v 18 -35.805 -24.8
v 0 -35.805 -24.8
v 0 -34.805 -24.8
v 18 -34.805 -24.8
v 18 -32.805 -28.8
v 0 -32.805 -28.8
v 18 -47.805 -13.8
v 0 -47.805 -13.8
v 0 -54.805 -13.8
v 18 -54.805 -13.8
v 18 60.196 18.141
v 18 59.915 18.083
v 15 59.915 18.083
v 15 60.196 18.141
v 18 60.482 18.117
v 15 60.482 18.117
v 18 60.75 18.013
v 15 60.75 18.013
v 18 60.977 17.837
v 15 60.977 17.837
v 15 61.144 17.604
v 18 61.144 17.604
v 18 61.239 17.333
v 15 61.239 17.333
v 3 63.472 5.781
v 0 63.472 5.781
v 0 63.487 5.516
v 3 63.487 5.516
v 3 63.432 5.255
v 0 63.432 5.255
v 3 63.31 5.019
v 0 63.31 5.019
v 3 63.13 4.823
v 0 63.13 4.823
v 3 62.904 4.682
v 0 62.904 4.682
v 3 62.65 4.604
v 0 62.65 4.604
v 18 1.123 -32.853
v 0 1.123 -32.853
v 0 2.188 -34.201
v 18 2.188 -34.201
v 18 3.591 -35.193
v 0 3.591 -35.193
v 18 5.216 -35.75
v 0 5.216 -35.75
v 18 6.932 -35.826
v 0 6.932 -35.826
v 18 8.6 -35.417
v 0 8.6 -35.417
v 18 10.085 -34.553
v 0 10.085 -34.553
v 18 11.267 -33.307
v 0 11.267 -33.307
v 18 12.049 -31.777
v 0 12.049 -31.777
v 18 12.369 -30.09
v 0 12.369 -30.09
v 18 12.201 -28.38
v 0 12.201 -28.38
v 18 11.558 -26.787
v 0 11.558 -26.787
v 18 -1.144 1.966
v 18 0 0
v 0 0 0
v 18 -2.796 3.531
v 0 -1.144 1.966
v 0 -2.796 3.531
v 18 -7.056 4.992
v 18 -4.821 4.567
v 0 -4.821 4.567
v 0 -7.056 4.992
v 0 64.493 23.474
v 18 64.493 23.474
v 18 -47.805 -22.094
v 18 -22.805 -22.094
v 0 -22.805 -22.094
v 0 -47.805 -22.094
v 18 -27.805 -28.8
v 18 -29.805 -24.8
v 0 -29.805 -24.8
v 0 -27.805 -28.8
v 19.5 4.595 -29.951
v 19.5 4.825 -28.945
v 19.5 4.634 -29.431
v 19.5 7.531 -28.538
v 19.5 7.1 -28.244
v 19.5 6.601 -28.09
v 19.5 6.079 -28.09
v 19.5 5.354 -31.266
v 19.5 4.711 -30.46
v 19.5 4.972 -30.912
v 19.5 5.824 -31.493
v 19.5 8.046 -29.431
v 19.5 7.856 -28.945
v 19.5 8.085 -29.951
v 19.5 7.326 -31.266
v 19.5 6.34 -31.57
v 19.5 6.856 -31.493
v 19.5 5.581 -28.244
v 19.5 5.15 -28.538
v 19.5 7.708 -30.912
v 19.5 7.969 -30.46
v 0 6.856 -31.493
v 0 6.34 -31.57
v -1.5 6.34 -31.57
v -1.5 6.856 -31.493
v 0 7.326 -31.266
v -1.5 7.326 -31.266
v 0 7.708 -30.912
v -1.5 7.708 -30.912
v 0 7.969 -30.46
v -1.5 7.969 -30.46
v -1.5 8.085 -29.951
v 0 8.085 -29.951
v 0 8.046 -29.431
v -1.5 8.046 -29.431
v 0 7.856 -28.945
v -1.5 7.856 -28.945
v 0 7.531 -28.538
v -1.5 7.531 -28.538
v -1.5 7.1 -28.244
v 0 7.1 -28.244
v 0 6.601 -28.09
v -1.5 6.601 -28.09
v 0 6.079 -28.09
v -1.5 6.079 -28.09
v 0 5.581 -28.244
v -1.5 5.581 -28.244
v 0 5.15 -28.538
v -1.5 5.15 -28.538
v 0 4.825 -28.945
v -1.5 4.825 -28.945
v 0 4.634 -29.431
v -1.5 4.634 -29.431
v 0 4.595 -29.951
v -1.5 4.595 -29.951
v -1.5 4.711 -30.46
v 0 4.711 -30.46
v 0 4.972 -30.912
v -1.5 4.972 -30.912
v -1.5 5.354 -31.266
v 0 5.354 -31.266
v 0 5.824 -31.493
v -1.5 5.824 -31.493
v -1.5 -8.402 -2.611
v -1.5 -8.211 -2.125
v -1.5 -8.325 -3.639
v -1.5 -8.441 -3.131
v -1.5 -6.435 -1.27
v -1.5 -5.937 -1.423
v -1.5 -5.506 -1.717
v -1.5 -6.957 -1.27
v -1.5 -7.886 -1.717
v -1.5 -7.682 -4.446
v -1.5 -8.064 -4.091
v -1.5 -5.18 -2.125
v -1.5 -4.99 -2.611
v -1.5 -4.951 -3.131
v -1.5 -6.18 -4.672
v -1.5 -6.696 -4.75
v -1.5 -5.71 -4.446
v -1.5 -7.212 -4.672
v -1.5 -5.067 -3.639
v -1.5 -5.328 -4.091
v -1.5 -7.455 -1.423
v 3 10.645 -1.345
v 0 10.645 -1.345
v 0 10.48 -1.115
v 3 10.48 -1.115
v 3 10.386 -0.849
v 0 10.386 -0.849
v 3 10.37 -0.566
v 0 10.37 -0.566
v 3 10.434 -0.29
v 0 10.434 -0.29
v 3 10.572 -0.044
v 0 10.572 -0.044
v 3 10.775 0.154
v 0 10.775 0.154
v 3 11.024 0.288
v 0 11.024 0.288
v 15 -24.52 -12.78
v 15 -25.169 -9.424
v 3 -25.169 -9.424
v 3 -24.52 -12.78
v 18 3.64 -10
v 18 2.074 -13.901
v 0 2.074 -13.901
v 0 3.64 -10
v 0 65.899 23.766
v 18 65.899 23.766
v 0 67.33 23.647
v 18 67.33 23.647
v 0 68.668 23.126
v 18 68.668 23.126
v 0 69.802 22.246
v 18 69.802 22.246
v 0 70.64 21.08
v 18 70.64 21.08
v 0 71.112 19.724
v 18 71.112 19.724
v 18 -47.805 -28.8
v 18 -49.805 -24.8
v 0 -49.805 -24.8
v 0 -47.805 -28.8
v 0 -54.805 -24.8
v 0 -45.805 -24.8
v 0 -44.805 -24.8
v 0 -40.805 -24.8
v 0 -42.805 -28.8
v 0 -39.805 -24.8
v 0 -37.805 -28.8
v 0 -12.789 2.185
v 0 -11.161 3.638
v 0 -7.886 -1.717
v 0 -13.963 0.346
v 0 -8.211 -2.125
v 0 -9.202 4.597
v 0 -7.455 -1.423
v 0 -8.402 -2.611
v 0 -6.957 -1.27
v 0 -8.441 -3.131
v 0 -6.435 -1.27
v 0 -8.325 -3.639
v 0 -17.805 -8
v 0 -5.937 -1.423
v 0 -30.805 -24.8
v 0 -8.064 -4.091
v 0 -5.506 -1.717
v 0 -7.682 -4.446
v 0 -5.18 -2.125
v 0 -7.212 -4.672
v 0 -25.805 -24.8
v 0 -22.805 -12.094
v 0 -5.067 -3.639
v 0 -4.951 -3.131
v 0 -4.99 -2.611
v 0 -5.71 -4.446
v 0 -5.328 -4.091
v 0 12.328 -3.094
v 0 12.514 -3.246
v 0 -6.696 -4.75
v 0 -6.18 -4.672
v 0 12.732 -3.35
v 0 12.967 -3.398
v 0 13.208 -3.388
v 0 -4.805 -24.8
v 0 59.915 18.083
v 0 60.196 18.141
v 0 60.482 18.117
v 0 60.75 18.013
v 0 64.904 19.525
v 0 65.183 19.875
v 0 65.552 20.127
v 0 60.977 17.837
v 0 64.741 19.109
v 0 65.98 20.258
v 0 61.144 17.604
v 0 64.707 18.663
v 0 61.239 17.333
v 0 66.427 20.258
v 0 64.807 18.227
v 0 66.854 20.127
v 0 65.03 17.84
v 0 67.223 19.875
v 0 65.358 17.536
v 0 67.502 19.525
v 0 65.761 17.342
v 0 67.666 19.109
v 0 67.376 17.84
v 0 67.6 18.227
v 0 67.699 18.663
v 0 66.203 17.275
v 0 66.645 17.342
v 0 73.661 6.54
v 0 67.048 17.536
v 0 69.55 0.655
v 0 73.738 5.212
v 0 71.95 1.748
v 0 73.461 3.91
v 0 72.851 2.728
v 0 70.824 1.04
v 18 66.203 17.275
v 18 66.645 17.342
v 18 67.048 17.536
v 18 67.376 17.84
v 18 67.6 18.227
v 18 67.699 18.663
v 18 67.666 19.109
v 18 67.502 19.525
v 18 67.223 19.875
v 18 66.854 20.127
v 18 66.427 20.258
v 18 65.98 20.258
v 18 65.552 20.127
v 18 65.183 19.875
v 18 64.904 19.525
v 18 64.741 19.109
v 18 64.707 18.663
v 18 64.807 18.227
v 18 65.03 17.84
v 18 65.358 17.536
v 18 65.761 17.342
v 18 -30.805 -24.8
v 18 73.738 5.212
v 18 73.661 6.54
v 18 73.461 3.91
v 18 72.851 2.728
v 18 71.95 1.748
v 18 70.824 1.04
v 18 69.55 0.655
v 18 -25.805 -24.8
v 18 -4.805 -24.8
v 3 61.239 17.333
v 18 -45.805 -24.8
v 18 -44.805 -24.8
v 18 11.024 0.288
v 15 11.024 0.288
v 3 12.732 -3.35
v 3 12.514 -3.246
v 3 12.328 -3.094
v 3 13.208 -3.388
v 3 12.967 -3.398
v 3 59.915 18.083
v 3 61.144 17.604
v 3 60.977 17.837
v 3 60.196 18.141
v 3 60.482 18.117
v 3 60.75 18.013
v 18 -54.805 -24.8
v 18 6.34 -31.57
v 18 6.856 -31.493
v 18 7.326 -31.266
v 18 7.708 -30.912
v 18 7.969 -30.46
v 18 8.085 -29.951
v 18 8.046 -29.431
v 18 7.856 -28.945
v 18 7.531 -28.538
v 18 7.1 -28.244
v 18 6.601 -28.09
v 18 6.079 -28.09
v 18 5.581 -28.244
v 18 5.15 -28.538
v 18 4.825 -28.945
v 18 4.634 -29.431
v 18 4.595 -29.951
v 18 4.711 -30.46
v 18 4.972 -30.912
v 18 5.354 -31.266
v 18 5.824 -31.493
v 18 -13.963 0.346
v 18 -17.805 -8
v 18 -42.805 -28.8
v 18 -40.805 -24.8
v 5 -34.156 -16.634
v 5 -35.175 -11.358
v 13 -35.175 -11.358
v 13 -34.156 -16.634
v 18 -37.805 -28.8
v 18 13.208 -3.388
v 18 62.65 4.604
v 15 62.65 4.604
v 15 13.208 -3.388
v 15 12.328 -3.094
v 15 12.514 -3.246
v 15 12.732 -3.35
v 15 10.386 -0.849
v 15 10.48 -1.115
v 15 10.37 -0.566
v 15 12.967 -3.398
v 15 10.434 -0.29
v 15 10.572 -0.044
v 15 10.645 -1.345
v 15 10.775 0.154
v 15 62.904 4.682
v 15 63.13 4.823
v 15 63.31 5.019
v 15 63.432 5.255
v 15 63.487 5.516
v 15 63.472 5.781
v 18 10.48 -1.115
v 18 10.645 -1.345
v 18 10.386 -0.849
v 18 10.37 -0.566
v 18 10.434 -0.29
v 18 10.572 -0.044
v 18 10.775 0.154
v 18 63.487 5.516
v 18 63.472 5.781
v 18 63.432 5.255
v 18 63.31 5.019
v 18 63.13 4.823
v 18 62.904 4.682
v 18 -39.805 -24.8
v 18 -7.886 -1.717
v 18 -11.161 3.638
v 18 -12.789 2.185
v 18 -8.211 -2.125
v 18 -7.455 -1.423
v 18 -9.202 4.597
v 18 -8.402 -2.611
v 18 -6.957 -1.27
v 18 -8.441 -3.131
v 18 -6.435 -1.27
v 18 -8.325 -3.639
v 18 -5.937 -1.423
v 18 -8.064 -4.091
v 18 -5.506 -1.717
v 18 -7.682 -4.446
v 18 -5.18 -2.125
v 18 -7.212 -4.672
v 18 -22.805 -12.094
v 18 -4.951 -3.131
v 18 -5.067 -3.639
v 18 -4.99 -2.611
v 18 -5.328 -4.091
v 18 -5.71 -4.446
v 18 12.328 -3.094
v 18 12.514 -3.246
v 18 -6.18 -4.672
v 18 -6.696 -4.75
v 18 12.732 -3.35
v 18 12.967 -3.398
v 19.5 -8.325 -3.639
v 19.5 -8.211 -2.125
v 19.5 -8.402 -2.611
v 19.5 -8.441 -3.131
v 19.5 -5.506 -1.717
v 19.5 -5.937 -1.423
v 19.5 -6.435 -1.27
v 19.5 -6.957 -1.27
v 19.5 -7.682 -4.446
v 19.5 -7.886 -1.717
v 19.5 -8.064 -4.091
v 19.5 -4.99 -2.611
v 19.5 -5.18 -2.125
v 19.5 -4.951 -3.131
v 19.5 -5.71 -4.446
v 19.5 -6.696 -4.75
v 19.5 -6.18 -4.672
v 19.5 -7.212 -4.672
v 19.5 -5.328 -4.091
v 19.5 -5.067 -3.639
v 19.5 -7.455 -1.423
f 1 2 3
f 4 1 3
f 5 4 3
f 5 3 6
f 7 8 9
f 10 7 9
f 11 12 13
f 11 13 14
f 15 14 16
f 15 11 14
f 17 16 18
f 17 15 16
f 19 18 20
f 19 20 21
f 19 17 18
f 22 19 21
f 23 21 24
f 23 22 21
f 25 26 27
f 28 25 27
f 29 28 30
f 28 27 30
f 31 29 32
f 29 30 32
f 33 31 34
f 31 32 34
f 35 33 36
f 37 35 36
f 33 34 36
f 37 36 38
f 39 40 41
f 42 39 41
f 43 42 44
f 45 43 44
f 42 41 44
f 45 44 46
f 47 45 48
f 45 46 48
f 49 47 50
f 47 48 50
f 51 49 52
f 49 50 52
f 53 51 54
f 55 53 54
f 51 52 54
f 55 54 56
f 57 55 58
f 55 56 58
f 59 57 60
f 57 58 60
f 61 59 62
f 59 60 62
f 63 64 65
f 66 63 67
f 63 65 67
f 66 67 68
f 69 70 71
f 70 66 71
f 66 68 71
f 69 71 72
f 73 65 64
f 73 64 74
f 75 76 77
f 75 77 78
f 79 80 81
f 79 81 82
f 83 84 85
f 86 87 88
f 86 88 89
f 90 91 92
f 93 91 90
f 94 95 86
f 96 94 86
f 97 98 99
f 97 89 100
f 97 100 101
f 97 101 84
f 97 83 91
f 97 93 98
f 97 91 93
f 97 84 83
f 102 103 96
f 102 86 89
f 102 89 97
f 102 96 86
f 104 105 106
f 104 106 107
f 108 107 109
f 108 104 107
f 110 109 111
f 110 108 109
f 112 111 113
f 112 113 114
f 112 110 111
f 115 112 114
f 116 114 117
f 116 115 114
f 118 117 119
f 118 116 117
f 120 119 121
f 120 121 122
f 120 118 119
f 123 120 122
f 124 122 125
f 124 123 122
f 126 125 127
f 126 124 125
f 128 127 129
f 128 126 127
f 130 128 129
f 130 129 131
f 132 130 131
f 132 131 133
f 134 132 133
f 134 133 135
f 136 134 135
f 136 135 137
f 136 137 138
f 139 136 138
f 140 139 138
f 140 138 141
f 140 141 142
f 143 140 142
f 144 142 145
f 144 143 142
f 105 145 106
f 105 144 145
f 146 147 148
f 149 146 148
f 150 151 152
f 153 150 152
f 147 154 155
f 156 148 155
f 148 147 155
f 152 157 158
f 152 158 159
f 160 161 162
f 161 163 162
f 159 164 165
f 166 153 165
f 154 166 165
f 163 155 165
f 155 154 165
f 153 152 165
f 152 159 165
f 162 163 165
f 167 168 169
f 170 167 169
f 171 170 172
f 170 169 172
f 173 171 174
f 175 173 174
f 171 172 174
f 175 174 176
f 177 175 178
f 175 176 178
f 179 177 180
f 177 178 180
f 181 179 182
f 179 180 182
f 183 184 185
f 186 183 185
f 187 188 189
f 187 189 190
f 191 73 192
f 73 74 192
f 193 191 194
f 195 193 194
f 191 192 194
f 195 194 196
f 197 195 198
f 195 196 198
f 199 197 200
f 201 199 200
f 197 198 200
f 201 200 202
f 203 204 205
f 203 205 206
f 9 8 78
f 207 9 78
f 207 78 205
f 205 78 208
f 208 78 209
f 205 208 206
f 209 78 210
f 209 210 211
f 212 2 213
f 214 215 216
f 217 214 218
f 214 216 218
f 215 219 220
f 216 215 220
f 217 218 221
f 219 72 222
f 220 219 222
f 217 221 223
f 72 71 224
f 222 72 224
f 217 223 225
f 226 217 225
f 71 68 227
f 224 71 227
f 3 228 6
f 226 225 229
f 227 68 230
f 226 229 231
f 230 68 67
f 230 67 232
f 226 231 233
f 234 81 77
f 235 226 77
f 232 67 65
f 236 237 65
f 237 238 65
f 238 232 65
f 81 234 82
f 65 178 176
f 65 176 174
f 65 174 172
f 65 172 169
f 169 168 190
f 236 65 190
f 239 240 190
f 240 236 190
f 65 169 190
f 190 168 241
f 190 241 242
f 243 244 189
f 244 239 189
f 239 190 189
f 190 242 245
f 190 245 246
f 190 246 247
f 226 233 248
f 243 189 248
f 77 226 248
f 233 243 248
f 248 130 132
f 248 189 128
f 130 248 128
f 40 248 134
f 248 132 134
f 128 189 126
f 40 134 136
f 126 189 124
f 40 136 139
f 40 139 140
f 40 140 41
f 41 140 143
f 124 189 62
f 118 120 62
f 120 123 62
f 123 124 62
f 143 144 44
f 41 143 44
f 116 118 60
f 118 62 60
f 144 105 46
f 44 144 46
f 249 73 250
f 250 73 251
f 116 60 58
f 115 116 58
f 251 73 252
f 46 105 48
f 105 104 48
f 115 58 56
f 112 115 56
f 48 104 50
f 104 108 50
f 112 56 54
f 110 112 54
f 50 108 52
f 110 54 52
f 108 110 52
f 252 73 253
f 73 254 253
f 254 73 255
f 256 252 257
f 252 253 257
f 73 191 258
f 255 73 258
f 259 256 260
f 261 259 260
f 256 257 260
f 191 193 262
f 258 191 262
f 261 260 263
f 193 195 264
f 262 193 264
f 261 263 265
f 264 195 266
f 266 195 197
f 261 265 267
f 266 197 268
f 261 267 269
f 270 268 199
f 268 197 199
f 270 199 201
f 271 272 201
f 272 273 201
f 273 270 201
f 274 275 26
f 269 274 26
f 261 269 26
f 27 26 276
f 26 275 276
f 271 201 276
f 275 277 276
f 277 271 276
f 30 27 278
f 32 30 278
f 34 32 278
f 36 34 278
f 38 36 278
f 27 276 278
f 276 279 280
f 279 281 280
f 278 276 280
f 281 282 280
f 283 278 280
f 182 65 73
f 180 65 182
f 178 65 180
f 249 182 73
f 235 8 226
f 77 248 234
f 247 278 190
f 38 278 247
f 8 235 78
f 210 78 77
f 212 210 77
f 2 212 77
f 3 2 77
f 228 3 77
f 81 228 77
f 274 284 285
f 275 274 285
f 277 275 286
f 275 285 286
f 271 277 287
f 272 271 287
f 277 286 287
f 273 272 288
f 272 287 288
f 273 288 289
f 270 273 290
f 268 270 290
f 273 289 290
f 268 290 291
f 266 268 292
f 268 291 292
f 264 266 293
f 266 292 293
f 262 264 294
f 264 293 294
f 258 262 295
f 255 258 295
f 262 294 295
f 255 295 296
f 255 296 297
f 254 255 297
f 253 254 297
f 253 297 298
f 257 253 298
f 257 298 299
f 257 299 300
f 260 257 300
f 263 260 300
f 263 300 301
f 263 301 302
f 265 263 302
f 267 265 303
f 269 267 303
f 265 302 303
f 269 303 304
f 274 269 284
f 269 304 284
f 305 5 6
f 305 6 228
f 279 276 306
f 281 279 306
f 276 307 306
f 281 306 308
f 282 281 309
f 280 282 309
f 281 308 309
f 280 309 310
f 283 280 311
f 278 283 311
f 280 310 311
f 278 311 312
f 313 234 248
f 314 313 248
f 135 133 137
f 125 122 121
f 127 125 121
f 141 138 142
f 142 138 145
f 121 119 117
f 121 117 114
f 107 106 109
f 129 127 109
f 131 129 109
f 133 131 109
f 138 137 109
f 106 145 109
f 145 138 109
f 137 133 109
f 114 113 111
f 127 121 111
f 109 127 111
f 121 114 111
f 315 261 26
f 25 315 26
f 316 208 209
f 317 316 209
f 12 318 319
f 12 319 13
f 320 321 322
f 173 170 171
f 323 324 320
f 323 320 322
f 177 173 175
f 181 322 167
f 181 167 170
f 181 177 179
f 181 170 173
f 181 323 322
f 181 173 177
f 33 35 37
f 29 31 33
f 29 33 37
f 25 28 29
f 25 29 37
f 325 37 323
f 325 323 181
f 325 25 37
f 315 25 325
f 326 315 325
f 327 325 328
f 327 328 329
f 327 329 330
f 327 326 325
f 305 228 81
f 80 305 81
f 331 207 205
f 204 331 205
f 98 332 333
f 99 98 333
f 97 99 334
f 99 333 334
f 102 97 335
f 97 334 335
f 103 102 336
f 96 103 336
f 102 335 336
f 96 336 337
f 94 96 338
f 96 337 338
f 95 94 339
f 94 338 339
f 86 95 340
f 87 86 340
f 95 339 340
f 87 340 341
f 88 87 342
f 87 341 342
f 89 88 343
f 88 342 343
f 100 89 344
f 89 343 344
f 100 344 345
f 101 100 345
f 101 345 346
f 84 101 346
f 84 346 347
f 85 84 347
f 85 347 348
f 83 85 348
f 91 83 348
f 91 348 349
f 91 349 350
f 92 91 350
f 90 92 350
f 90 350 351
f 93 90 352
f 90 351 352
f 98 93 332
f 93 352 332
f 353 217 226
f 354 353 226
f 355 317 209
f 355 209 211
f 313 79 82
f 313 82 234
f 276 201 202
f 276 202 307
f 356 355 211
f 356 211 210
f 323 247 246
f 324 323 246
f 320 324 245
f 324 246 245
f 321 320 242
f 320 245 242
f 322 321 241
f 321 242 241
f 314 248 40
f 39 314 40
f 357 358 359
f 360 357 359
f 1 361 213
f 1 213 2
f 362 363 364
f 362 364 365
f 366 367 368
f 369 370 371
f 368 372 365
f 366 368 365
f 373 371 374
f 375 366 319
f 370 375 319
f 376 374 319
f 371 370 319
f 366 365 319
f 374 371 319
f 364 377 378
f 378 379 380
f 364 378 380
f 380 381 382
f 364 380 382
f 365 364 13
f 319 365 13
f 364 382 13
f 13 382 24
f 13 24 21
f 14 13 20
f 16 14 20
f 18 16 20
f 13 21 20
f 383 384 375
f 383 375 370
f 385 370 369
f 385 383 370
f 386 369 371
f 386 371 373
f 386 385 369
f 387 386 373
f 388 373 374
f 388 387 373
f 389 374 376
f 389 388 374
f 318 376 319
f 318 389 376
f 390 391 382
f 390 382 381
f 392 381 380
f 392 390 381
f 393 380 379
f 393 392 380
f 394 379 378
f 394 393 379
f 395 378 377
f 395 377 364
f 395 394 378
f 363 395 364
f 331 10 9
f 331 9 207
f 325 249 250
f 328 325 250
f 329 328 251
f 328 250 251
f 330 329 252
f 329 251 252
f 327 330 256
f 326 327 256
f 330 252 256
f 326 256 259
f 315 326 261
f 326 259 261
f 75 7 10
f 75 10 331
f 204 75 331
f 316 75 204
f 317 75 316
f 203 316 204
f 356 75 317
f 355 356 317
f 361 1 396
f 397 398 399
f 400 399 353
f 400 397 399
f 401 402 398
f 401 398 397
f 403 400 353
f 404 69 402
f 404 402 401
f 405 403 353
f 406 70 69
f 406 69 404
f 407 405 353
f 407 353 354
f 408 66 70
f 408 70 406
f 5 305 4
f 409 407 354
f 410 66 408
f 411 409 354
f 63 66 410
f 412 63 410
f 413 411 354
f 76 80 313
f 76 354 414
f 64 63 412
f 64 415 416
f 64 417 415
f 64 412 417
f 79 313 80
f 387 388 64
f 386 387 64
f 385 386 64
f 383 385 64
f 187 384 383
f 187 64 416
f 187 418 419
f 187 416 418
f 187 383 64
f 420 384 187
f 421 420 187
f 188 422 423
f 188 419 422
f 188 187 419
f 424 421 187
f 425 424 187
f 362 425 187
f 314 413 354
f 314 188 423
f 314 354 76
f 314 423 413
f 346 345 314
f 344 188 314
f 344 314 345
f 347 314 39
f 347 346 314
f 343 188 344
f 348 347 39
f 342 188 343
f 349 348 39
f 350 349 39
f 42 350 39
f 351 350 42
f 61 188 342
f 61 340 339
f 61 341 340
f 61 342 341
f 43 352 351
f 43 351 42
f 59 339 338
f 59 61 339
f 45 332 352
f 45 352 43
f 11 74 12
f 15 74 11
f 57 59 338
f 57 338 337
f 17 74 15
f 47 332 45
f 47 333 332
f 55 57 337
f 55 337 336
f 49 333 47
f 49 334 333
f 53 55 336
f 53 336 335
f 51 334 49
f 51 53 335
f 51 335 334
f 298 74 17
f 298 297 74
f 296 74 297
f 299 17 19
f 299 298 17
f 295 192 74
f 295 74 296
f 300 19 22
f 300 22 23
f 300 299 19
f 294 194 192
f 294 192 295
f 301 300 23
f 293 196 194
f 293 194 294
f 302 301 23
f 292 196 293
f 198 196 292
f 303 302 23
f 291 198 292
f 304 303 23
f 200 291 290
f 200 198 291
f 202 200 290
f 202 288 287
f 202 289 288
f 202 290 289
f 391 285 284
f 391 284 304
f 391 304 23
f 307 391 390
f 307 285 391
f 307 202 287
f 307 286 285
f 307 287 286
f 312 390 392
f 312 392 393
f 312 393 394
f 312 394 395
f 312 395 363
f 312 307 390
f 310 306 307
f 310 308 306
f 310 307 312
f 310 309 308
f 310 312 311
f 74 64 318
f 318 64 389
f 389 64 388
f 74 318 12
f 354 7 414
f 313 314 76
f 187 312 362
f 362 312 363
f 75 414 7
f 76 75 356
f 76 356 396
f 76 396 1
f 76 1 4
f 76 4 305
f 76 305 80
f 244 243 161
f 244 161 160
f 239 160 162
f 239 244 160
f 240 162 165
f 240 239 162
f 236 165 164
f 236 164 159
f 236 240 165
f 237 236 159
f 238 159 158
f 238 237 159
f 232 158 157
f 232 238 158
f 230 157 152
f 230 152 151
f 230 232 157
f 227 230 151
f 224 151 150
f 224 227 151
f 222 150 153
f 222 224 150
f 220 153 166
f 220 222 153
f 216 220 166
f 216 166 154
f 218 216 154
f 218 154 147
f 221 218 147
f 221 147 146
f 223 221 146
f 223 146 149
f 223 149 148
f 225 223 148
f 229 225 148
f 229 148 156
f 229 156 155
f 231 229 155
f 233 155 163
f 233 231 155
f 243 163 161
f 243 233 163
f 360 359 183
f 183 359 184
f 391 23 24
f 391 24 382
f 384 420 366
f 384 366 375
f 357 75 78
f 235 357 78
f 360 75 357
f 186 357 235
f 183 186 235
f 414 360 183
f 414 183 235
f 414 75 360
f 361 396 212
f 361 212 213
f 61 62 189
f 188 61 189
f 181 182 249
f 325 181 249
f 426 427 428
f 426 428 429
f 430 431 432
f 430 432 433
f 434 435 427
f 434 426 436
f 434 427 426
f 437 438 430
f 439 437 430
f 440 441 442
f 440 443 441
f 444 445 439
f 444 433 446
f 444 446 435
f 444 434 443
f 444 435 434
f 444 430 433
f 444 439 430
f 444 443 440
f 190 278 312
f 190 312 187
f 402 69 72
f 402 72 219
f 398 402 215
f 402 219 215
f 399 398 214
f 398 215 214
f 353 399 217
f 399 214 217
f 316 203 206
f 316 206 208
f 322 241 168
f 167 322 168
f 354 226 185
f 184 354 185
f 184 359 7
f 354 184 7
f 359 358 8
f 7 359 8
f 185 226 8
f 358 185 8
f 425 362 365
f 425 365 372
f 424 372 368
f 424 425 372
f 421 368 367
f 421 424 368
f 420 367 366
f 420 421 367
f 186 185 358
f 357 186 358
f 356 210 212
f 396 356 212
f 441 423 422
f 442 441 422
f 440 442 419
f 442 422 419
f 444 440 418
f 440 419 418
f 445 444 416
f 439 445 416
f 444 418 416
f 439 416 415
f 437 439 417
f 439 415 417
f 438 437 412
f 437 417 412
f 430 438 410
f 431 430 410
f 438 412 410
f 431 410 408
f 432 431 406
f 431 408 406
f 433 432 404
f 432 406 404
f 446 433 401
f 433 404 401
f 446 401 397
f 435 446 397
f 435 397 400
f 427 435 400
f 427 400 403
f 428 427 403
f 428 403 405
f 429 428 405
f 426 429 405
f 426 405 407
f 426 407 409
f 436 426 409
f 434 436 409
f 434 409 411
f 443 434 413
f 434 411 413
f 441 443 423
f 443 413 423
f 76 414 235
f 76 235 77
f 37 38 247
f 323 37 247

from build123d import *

# Parameters (mm, degrees)
BOSS_EXTRUDE1_DEPTH = 18
CUT_EXTRUDE1_DEPTH  = 18
BOSS_EXTRUDE2_DEPTH = 18
LPATTERN1_COUNT     = 5
LPATTERN1_PITCH     = 5
FILLET1_R           = 8
FILLET2_R           = 5
SKETCH4_R           = 1.5
CUT_EXTRUDE2_DEPTH  = 18
CUT_EXTRUDE3_DEPTH  = 6
SKETCH6_R           = 1.75
BOSS_EXTRUDE3_DEPTH = 1.5
SKETCH7_R           = 1.75
BOSS_EXTRUDE4_DEPTH = 1.5
CUT_EXTRUDE4_DEPTH  = 3


with BuildPart() as part:
    # Sketch1 → Boss-Extrude1 (new body)
    with BuildSketch(Plane(origin=(0, 0, 0), x_dir=(0, 0, -1), z_dir=(1, 0, 0))):
        with BuildLine():
            Line((24.799627928, -4.804973216), (32.853416759, 1.122630471))
            ThreePointArc((32.853416759, 1.122630471), (35.038056902, 9.373242879), (26.787444494, 11.557883023))
            Line((26.787444494, 11.557883023), (13.901382366, 2.073717122))
            Line((13.901382366, 2.073717122), (10, 3.639702343))
            Line((10, 3.639702343), (0, 0))
            Line((0, 0), (-5, -1.819851171))
            Line((-5, -1.819851171), (-5, -11.819851171))
            Line((-5, -11.819851171), (8, -17.804973216))
            Line((8, -17.804973216), (13.799627928, -47.804973216))
            Line((13.799627928, -47.804973216), (13.799627928, -54.804973216))
            Line((13.799627928, -54.804973216), (24.799627928, -54.804973216))
            Line((24.799627928, -54.804973216), (24.799627928, -4.804973216))
        make_face()
        Polygon((10, 3.639702343), (0, 0), (-25.477916399, 70), (-1.477916399, 74.639702343), align=None)
    extrude(amount=BOSS_EXTRUDE1_DEPTH)

    # Sketch2 → Cut-Extrude1 (cut)
    with BuildSketch(Plane(origin=(18, 0, 0), x_dir=(0, 0, -1), z_dir=(1, 0, 0))):
        Polygon((12.09390479, -22.804973216), (22.09390479, -22.804973216), (22.09390479, -47.804973216), align=None)
    extrude(amount=-CUT_EXTRUDE1_DEPTH, mode=Mode.SUBTRACT)

    # Sketch3 → Boss-Extrude2 (add)
    with BuildSketch(Plane(origin=(18, 0, 0), x_dir=(0, 0, -1), z_dir=(1, 0, 0))):
        Polygon((24.799627928, -47.804973216), (24.799627928, -49.804973216), (28.799627928, -47.804973216), align=None)
        Polygon((24.799627928, -47.804973216), (28.799627928, -47.804973216), (24.799627928, -45.804973216), align=None)
    boss_extrude2 = extrude(amount=-BOSS_EXTRUDE2_DEPTH)

    # LPattern1: Boss-Extrude2 ×5
    with Locations(*[(0, i * LPATTERN1_PITCH, 0) for i in range(1, LPATTERN1_COUNT)]):
        add(boss_extrude2)

    # Fillet1
    # the kernel refuses this fillet: 8 mm, written as the material it takes off along each edge
    with BuildSketch(Plane(origin=(-13.990868289, -1.819851171, 5), x_dir=(0, 0.34202014332566644, -0.9396926207859092), z_dir=(1, 0, 0))) as fillet1_piece_1:
        with BuildLine():
            CenterArc((5.603477455, -7.995007423), FILLET1_R, 92.024312837, 67.975687163)
            Line((-1.914063511, -5.258846276), (-2.06441433, -5.204123053))
            Line((-2.06441433, -5.204123053), (-0.150350819, 0.054723223))
            Line((-0.150350819, 0.054723223), (0, 0.16))
            ThreePointArc((0, 0.16), (2.660444431, 0.16), (5.315237091, 0.159900148))
            Line((5.315237091, 0.159900148), (5.320888862, 0))
        make_face()
    extrude(amount=45.981736579, mode=Mode.SUBTRACT)
    with BuildSketch(Plane(origin=(-12.809954869, -11.819851171, 5), x_dir=(0, 1, 0), z_dir=(1, 0, 0))) as fillet1_piece_2:
        with BuildLine():
            CenterArc((FILLET1_R * 0.640497743455, -FILLET1_R), FILLET1_R, 90, 65.278940391)
            Line((-FILLET1_R * 0.267856781688, -FILLET1_R * 0.581799023611), (-FILLET1_R * 0.286023872191, -FILLET1_R * 0.573435004083))
            Line((-FILLET1_R * 0.286023872191, -FILLET1_R * 0.573435004083), (-FILLET1_R * 0.0128099548691, FILLET1_R * 0.02))
            Line((-FILLET1_R * 0.0128099548691, FILLET1_R * 0.02), (FILLET1_R * 0.640497743455, FILLET1_R * 0.02))
            Line((FILLET1_R * 0.640497743455, FILLET1_R * 0.02), (FILLET1_R * 0.640497743455, 0))
        make_face()
    extrude(amount=43.619909738, mode=Mode.SUBTRACT)

    # Fillet2
    fillet2_edges = [part.edges().sort_by_distance(p)[0] for p in [
        (9, 70, 25.477916399),
        (9, 74.639702343, 1.477916399),
    ]]
    fillet(fillet2_edges, radius=FILLET2_R)

    # Sketch4 → Cut-Extrude2 (cut)
    with BuildSketch(Plane(origin=(18, 0, 0), x_dir=(0, 0, -1), z_dir=(1, 0, 0))):
        with Locations((-18.775111552, 66.203217038)):
            Circle(SKETCH4_R)
    extrude(amount=-CUT_EXTRUDE2_DEPTH, mode=Mode.SUBTRACT)

    # Sketch5 → Cut-Extrude3 (cut)
    with BuildSketch(Plane(origin=(0, 0.849397963, -4.393719597), x_dir=(1, 0, 0), z_dir=(0, -0.1898066444194718, 0.981821489749649))):
        Polygon((15, -26.499758484), (9, -26.499758484), (3, -26.499758484), (5, -36.691893202), (9, -36.691893202), (13, -36.691893202), align=None)
    extrude(amount=-CUT_EXTRUDE3_DEPTH, mode=Mode.SUBTRACT)

    # Sketch6 → Boss-Extrude3 (add)
    with BuildSketch(Plane(origin=(18, 0, 0), x_dir=(0, 0, -1), z_dir=(1, 0, 0))):
        with Locations((29.820430626, 6.340256747)):
            Circle(SKETCH6_R)
    boss_extrude3 = extrude(amount=BOSS_EXTRUDE3_DEPTH)

    # Sketch7 → Boss-Extrude4 (add)
    with BuildSketch(Plane(origin=(18, 0, 0), x_dir=(0, 0, -1), z_dir=(1, 0, 0))):
        with Locations((3, -6.695869224)):
            Circle(SKETCH7_R)
    boss_extrude4 = extrude(amount=BOSS_EXTRUDE4_DEPTH)

    # Sketch8 → Cut-Extrude4 (cut)
    with BuildSketch(Plane(origin=(18, 0, 0), x_dir=(0, 0, -1), z_dir=(1, 0, 0))):
        with BuildLine():
            Line((-17.332707084, 61.238673153), (-5.781480677, 63.471766995))
            ThreePointArc((-5.781480677, 63.471766995), (-5.018988164, 63.309720411), (-4.604490469, 62.649534384))
            Line((-4.604490469, 62.649534384), (3.388275701, 13.207947746))
            ThreePointArc((3.388275701, 13.207947746), (3.349595335, 12.731591312), (3.094265813, 12.327588269))
            Line((3.094265813, 12.327588269), (1.345046537, 10.645343239))
            ThreePointArc((1.345046537, 10.645343239), (0.425917391, 10.391976204), (-0.28781976, 11.024093693))
            Line((-0.28781976, 11.024093693), (-18.08259306, 59.914831519))
            ThreePointArc((-18.08259306, 59.914831519), (-18.013004637, 60.74971948), (-17.332707084, 61.238673153))
        make_face()
    cut_extrude4 = extrude(amount=-CUT_EXTRUDE4_DEPTH, mode=Mode.SUBTRACT)

    # Mirror1: Boss-Extrude3, Boss-Extrude4, Cut-Extrude4 across plane
    add(boss_extrude3.mirror(Plane(origin=(9, 0, 0), x_dir=(0, 0, 1), z_dir=(1, 0, 0))))
    add(boss_extrude4.mirror(Plane(origin=(9, 0, 0), x_dir=(0, 0, 1), z_dir=(1, 0, 0))))
    add(cut_extrude4.mirror(Plane(origin=(9, 0, 0), x_dir=(0, 0, 1), z_dir=(1, 0, 0))), mode=Mode.SUBTRACT)


solid = part.part
